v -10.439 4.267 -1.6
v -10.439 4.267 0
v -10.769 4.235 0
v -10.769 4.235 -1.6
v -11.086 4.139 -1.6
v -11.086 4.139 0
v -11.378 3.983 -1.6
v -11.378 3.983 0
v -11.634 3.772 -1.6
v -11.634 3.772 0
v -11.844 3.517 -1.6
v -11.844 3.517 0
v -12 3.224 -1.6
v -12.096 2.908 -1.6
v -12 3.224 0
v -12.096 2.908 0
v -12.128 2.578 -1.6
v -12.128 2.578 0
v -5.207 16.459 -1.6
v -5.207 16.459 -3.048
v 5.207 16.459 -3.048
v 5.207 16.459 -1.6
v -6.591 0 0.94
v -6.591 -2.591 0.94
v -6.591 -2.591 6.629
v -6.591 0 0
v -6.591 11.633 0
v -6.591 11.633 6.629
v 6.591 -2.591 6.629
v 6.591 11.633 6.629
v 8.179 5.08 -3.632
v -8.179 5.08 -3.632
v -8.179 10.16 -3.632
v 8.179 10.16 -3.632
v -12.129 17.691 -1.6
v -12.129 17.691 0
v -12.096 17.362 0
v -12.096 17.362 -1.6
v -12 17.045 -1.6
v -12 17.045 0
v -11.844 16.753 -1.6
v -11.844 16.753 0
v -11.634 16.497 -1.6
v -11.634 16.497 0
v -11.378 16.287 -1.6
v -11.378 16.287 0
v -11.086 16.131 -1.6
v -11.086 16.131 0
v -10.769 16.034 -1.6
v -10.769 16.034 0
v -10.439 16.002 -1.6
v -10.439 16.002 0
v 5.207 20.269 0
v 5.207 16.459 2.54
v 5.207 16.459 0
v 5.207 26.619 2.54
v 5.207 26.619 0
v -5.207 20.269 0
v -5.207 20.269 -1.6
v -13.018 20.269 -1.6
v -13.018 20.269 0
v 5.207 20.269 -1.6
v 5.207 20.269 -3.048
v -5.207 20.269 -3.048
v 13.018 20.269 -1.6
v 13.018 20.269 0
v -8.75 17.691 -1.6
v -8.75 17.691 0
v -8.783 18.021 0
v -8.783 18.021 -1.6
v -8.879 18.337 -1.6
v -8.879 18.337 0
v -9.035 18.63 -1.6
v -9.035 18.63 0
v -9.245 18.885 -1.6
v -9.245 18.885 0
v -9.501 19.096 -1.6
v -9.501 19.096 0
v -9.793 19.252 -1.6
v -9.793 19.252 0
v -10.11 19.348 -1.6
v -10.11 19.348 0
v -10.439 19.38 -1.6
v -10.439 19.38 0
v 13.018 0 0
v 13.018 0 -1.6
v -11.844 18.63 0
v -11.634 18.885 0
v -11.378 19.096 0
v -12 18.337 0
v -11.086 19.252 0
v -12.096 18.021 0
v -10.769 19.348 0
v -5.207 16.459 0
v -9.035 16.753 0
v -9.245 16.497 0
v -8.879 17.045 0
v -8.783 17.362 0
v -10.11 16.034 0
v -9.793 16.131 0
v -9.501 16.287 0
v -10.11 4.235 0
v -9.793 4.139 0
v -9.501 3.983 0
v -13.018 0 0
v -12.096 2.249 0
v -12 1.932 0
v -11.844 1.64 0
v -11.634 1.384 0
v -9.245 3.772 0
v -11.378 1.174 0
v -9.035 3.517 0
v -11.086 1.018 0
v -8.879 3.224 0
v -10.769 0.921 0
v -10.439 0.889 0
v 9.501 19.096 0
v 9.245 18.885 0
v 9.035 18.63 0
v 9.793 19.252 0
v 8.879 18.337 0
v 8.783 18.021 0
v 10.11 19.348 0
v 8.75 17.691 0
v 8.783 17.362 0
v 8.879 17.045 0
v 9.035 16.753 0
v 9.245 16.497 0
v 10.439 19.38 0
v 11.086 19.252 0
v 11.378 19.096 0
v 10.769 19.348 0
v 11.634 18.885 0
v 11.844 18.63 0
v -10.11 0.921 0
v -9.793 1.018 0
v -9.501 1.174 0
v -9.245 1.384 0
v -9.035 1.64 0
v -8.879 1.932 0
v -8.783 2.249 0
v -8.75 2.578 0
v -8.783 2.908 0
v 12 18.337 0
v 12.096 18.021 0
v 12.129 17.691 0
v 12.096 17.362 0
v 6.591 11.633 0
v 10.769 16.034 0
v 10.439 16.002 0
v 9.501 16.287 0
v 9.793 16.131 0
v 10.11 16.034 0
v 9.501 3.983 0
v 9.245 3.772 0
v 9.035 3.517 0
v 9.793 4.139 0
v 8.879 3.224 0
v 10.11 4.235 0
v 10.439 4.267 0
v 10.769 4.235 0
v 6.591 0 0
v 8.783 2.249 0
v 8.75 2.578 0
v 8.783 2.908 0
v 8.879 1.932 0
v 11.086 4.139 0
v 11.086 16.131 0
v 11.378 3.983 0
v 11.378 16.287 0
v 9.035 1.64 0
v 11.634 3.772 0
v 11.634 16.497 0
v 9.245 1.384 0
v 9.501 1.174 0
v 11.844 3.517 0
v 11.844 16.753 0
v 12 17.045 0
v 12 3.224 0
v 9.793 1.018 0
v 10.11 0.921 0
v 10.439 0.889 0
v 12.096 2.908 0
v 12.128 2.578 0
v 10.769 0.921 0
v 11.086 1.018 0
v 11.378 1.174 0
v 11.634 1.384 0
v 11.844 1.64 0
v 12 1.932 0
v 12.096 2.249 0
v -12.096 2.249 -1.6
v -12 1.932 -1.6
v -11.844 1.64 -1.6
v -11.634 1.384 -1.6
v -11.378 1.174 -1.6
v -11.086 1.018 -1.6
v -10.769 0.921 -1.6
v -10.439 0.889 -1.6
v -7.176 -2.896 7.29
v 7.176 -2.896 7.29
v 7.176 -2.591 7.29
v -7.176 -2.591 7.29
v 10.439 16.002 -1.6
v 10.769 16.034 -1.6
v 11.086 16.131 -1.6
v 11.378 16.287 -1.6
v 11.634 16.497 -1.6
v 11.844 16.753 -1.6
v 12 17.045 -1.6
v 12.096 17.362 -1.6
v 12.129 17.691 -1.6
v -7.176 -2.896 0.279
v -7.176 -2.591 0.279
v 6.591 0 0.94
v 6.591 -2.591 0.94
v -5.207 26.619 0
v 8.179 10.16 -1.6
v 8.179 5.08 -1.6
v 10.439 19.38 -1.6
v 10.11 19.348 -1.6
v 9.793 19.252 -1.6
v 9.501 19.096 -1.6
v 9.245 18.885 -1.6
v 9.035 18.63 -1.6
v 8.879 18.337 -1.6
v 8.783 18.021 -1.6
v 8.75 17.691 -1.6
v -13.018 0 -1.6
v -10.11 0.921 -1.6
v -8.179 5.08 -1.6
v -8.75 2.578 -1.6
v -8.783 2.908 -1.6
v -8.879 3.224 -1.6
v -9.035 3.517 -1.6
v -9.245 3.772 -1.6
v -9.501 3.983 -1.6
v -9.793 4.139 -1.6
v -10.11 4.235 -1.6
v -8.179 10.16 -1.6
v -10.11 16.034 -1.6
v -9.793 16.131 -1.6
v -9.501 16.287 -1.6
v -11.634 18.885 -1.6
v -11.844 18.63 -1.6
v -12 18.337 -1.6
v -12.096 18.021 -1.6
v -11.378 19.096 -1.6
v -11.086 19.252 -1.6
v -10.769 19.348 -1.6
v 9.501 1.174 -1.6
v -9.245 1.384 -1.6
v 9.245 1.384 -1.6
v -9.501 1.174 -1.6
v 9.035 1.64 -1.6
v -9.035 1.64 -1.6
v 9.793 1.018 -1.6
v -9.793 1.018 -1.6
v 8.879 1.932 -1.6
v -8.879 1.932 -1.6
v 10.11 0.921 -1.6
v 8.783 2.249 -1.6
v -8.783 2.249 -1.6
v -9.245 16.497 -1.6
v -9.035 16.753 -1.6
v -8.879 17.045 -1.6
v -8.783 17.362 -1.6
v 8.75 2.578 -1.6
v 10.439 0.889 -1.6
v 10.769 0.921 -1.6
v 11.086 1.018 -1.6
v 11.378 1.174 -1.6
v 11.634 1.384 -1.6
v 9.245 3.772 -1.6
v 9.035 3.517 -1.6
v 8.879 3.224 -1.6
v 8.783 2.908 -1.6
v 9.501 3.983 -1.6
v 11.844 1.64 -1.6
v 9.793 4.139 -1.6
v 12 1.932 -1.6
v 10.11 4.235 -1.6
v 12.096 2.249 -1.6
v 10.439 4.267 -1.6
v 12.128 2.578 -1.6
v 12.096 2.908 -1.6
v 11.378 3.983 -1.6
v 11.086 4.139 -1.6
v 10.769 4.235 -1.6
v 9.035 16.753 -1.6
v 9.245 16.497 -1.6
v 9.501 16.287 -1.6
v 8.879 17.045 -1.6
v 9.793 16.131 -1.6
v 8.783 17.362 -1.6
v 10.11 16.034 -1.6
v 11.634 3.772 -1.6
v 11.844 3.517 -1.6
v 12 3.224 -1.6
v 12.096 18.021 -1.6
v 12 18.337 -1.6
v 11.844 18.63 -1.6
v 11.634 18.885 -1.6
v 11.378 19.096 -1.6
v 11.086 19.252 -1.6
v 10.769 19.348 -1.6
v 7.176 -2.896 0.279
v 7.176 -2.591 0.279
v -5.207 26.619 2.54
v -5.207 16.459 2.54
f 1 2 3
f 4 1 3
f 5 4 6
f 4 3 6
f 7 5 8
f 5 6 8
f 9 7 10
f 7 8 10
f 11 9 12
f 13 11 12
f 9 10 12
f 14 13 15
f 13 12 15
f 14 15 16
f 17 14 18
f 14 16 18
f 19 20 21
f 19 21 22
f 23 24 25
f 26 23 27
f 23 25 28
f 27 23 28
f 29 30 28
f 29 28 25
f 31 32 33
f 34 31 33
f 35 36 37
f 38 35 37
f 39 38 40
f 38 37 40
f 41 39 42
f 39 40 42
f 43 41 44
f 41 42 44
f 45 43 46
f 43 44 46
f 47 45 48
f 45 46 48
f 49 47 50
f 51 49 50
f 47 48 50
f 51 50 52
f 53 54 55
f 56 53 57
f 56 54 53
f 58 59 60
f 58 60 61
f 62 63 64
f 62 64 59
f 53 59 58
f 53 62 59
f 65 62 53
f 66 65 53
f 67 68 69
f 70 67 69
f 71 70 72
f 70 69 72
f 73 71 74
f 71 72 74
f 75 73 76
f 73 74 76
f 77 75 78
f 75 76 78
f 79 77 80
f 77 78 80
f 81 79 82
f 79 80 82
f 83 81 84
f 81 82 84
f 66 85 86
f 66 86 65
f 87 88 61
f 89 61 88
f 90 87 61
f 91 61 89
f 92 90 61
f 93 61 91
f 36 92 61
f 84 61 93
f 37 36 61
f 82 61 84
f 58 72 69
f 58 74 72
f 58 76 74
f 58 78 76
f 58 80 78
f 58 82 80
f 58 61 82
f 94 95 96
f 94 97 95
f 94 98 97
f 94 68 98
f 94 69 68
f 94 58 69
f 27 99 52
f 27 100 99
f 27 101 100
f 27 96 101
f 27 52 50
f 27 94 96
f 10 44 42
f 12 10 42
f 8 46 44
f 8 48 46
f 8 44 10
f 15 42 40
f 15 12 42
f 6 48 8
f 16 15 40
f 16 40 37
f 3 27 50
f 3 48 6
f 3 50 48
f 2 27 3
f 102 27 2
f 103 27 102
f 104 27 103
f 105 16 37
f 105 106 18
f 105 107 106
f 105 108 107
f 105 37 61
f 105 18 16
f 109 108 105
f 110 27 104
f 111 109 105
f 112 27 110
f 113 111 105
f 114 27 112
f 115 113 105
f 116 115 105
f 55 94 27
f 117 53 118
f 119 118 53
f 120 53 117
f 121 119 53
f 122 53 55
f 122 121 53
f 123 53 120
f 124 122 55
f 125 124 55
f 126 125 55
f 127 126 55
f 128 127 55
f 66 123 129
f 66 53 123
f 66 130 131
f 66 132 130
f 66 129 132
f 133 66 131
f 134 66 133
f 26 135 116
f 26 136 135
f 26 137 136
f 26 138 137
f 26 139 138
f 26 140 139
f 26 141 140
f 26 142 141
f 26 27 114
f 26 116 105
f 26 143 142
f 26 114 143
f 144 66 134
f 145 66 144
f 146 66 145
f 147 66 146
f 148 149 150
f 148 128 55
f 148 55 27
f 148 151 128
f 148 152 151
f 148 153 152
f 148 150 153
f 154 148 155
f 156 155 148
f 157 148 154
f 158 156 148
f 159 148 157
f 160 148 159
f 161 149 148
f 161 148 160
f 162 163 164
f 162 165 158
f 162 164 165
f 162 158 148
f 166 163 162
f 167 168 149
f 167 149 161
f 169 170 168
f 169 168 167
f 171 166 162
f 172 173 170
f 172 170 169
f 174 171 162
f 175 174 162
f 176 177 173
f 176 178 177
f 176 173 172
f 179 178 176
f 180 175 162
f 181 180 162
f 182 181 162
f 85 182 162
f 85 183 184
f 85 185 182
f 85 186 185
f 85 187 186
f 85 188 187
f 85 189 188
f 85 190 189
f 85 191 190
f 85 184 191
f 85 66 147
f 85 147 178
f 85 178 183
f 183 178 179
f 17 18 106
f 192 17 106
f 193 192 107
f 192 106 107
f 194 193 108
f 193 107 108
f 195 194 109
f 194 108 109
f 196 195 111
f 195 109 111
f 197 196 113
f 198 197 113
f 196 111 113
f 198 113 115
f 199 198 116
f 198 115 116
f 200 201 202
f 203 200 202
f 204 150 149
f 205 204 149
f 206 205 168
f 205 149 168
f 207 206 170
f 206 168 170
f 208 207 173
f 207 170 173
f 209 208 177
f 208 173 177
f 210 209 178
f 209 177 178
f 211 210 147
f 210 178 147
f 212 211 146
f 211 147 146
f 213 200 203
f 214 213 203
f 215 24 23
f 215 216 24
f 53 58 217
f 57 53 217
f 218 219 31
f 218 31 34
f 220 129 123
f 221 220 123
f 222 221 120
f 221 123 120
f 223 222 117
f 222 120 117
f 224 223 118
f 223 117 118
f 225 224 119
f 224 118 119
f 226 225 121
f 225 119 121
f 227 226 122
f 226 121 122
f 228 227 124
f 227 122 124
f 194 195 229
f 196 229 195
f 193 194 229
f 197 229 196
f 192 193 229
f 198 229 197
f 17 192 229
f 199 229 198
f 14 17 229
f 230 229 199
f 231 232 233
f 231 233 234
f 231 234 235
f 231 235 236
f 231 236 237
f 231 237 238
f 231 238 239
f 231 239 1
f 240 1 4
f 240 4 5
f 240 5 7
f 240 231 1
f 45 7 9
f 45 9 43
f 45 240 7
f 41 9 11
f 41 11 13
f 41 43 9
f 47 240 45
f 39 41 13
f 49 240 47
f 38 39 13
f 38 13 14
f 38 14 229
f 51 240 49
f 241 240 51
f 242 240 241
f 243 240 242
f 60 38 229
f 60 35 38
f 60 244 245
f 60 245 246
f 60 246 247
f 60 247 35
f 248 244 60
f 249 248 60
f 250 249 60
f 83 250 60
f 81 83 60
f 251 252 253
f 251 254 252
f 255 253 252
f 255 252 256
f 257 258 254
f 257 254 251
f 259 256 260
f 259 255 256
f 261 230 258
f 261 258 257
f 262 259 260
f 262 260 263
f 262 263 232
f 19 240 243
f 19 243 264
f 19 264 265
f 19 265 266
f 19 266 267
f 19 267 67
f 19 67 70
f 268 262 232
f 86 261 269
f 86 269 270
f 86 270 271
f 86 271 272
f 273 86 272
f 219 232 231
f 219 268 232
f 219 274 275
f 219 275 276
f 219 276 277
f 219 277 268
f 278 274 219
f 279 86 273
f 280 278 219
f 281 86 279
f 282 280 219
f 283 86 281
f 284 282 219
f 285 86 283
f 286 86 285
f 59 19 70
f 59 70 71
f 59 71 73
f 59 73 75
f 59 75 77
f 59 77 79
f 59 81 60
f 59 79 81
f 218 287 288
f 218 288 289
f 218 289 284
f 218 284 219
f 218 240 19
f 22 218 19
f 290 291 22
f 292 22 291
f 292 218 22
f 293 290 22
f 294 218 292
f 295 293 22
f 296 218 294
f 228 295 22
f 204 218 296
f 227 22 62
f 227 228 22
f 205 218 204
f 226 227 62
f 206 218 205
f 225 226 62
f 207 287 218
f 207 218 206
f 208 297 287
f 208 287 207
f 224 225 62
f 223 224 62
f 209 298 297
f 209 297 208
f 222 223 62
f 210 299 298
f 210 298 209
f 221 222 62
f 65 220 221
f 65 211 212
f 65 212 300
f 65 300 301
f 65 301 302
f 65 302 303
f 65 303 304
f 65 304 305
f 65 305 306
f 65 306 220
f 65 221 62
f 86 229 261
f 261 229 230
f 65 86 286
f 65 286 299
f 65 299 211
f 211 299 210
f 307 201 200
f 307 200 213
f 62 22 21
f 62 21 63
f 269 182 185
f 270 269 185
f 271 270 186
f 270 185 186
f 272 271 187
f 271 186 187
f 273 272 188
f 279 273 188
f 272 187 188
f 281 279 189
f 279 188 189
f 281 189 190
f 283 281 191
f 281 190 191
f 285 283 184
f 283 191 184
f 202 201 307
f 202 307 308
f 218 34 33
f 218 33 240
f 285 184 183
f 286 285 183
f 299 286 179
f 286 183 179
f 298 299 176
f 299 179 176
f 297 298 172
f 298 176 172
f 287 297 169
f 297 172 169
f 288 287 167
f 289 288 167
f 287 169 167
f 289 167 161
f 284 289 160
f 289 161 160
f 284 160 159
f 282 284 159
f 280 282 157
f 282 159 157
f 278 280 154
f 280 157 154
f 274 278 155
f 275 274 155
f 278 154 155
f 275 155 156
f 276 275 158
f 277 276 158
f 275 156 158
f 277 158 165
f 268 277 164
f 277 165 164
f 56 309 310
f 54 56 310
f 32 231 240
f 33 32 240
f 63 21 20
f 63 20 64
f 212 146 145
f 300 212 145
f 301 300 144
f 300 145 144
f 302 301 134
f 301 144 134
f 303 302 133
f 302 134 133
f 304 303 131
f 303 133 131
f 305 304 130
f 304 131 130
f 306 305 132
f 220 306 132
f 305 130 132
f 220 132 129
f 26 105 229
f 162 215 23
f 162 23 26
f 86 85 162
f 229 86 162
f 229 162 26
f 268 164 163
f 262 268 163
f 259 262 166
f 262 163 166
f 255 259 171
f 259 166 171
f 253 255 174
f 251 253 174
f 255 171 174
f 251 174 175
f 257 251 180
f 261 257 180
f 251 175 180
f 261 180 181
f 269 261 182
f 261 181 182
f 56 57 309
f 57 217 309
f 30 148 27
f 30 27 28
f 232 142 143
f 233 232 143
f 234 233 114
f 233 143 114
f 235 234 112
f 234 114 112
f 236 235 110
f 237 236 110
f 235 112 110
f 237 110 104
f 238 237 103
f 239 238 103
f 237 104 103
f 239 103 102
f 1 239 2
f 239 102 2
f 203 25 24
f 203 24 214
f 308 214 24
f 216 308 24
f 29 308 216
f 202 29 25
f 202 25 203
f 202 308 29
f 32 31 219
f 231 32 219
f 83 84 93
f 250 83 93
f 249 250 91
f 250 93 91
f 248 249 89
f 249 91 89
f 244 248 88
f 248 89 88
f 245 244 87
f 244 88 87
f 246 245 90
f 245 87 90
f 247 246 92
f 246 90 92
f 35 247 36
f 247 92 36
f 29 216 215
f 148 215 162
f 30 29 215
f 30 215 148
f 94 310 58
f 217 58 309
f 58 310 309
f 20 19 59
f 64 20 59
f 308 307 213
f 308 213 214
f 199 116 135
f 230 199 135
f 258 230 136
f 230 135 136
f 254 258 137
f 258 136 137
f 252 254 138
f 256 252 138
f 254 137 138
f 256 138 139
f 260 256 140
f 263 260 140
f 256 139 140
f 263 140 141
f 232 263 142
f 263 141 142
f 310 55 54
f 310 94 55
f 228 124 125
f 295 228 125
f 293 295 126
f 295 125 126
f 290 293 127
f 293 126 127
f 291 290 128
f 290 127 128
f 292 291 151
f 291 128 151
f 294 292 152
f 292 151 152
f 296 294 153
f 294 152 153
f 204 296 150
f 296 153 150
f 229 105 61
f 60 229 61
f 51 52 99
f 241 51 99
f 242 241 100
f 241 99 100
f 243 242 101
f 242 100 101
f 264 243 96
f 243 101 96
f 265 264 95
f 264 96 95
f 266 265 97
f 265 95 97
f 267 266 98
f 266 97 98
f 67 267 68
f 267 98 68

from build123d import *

# Parameters (mm, degrees)
F0_W     = 3.81
F0_H     = 1.6002
F1_DEPTH = 13.0175
F0_W_2   = 11.6332
F0_H_2   = 0.9398
F2_DEPTH = 6.5913
F0_W_3   = 0.3048
F0_H_3   = 2.8448
F0_H_4   = 0.6604
F3_DEPTH = 7.1755
F0_H_5   = 2.54
F0_W_4   = 6.35
F0_H_6   = 1.4478
F4_DEPTH = 5.207
F0_W_5   = 5.08
F0_H_7   = 2.032
F5_DEPTH = 8.1788
F7_DEPTH = 3.6332


with BuildPart() as f1:
    # F0 (on Right) → F1 (new body, symmetric)
    with BuildSketch(Plane.YZ):
        Polygon((11.6332, 0), (0, 0), (0, -1.6002), (5.08, -1.6002), (10.16, -1.6002), (16.4592, -1.6002), (16.4592, 0), align=None)
        with Locations((18.3642, -0.8001)):
            Rectangle(F0_W, F0_H)
    extrude(amount=F1_DEPTH, both=True)

    # F0 (on Right) → F2 (join, symmetric)
    with BuildSketch(Plane.YZ):
        with Locations((5.8166, 0.4699)):
            Rectangle(F0_W_2, F0_H_2)
        Polygon((-2.5908, 0.9398), (0, 0.9398), (11.6332, 0.9398), (11.6332, 6.6294), (-2.5908, 6.6294), (-2.5908, 3.7846), align=None)
    extrude(amount=F2_DEPTH, both=True)

    # F0 (on Right) → F3 (join, symmetric)
    with BuildSketch(Plane.YZ):
        with Locations((-2.7432, 5.207)):
            Rectangle(F0_W_3, F0_H_3)
        with Locations((-2.7432, 6.9596)):
            Rectangle(F0_W_3, F0_H_4)
        with Locations((-2.7432, 2.3622)):
            Rectangle(F0_W_3, F0_H_3)
        with Locations((-2.7432, 0.6096)):
            Rectangle(F0_W_3, F0_H_4)
    extrude(amount=F3_DEPTH, both=True)

    # F0 (on Right) → F4 (join, symmetric)
    with BuildSketch(Plane.YZ):
        with Locations((18.3642, 1.27)):
            Rectangle(F0_W, F0_H_5)
        with Locations((23.4442, 1.27)):
            Rectangle(F0_W_4, F0_H_5)
        with Locations((18.3642, -2.3241)):
            Rectangle(F0_W, F0_H_6)
    extrude(amount=F4_DEPTH, both=True)

    # F0 (on Right) → F5 (join, symmetric)
    with BuildSketch(Plane.YZ):
        with Locations((7.62, -2.6162)):
            Rectangle(F0_W_5, F0_H_7)
    extrude(amount=F5_DEPTH, both=True)

    # F6 (on face) → F7 (cut, through all)
    with BuildSketch(Plane.XY):
        with BuildLine():
            Line((-10.4394, 4.2672), (-10.4394, 0.889))
            ThreePointArc((-10.4394, 0.889), (-9.245026, 1.383726), (-8.7503, 2.5781))
            ThreePointArc((-8.7503, 2.5781), (-9.245026, 3.772474), (-10.4394, 4.2672))
        make_face()
        with BuildLine():
            ThreePointArc((-12.1285, 2.5781), (-11.633774, 1.383726), (-10.4394, 0.889))
            Line((-10.4394, 0.889), (-10.4394, 4.2672))
            ThreePointArc((-10.4394, 4.2672), (-11.633774, 3.772474), (-12.1285, 2.5781))
        make_face()
        with BuildLine():
            Line((-10.4394, 19.3802), (-10.4394, 16.002))
            ThreePointArc((-10.4394, 16.002), (-9.245026, 16.496726), (-8.7503, 17.6911))
            ThreePointArc((-8.7503, 17.6911), (-9.245026, 18.885474), (-10.4394, 19.3802))
        make_face()
        with BuildLine():
            ThreePointArc((-12.1285, 17.6911), (-11.633774, 16.496726), (-10.4394, 16.002))
            Line((-10.4394, 16.002), (-10.4394, 19.3802))
            ThreePointArc((-10.4394, 19.3802), (-11.633774, 18.885474), (-12.1285, 17.6911))
        make_face()
        with BuildLine():
            ThreePointArc((8.7503, 17.6911), (9.245026, 16.496726), (10.4394, 16.002))
            Line((10.4394, 16.002), (10.4394, 19.3802))
            ThreePointArc((10.4394, 19.3802), (9.245026, 18.885474), (8.7503, 17.6911))
        make_face()
        with BuildLine():
            Line((10.4394, 19.3802), (10.4394, 16.002))
            ThreePointArc((10.4394, 16.002), (11.633774, 16.496726), (12.1285, 17.6911))
            ThreePointArc((12.1285, 17.6911), (11.633774, 18.885474), (10.4394, 19.3802))
        make_face()
        with BuildLine():
            ThreePointArc((8.7503, 2.5781), (9.245026, 1.383726), (10.4394, 0.889))
            Line((10.4394, 0.889), (10.4394, 4.2672))
            ThreePointArc((10.4394, 4.2672), (9.245026, 3.772474), (8.7503, 2.5781))
        make_face()
        with BuildLine():
            Line((10.4394, 4.2672), (10.4394, 0.889))
            ThreePointArc((10.4394, 0.889), (11.633774, 1.383726), (12.1285, 2.5781))
            ThreePointArc((12.1285, 2.5781), (11.633774, 3.772474), (10.4394, 4.2672))
        make_face()
    extrude(amount=-F7_DEPTH, mode=Mode.SUBTRACT)


solid = f1.part
